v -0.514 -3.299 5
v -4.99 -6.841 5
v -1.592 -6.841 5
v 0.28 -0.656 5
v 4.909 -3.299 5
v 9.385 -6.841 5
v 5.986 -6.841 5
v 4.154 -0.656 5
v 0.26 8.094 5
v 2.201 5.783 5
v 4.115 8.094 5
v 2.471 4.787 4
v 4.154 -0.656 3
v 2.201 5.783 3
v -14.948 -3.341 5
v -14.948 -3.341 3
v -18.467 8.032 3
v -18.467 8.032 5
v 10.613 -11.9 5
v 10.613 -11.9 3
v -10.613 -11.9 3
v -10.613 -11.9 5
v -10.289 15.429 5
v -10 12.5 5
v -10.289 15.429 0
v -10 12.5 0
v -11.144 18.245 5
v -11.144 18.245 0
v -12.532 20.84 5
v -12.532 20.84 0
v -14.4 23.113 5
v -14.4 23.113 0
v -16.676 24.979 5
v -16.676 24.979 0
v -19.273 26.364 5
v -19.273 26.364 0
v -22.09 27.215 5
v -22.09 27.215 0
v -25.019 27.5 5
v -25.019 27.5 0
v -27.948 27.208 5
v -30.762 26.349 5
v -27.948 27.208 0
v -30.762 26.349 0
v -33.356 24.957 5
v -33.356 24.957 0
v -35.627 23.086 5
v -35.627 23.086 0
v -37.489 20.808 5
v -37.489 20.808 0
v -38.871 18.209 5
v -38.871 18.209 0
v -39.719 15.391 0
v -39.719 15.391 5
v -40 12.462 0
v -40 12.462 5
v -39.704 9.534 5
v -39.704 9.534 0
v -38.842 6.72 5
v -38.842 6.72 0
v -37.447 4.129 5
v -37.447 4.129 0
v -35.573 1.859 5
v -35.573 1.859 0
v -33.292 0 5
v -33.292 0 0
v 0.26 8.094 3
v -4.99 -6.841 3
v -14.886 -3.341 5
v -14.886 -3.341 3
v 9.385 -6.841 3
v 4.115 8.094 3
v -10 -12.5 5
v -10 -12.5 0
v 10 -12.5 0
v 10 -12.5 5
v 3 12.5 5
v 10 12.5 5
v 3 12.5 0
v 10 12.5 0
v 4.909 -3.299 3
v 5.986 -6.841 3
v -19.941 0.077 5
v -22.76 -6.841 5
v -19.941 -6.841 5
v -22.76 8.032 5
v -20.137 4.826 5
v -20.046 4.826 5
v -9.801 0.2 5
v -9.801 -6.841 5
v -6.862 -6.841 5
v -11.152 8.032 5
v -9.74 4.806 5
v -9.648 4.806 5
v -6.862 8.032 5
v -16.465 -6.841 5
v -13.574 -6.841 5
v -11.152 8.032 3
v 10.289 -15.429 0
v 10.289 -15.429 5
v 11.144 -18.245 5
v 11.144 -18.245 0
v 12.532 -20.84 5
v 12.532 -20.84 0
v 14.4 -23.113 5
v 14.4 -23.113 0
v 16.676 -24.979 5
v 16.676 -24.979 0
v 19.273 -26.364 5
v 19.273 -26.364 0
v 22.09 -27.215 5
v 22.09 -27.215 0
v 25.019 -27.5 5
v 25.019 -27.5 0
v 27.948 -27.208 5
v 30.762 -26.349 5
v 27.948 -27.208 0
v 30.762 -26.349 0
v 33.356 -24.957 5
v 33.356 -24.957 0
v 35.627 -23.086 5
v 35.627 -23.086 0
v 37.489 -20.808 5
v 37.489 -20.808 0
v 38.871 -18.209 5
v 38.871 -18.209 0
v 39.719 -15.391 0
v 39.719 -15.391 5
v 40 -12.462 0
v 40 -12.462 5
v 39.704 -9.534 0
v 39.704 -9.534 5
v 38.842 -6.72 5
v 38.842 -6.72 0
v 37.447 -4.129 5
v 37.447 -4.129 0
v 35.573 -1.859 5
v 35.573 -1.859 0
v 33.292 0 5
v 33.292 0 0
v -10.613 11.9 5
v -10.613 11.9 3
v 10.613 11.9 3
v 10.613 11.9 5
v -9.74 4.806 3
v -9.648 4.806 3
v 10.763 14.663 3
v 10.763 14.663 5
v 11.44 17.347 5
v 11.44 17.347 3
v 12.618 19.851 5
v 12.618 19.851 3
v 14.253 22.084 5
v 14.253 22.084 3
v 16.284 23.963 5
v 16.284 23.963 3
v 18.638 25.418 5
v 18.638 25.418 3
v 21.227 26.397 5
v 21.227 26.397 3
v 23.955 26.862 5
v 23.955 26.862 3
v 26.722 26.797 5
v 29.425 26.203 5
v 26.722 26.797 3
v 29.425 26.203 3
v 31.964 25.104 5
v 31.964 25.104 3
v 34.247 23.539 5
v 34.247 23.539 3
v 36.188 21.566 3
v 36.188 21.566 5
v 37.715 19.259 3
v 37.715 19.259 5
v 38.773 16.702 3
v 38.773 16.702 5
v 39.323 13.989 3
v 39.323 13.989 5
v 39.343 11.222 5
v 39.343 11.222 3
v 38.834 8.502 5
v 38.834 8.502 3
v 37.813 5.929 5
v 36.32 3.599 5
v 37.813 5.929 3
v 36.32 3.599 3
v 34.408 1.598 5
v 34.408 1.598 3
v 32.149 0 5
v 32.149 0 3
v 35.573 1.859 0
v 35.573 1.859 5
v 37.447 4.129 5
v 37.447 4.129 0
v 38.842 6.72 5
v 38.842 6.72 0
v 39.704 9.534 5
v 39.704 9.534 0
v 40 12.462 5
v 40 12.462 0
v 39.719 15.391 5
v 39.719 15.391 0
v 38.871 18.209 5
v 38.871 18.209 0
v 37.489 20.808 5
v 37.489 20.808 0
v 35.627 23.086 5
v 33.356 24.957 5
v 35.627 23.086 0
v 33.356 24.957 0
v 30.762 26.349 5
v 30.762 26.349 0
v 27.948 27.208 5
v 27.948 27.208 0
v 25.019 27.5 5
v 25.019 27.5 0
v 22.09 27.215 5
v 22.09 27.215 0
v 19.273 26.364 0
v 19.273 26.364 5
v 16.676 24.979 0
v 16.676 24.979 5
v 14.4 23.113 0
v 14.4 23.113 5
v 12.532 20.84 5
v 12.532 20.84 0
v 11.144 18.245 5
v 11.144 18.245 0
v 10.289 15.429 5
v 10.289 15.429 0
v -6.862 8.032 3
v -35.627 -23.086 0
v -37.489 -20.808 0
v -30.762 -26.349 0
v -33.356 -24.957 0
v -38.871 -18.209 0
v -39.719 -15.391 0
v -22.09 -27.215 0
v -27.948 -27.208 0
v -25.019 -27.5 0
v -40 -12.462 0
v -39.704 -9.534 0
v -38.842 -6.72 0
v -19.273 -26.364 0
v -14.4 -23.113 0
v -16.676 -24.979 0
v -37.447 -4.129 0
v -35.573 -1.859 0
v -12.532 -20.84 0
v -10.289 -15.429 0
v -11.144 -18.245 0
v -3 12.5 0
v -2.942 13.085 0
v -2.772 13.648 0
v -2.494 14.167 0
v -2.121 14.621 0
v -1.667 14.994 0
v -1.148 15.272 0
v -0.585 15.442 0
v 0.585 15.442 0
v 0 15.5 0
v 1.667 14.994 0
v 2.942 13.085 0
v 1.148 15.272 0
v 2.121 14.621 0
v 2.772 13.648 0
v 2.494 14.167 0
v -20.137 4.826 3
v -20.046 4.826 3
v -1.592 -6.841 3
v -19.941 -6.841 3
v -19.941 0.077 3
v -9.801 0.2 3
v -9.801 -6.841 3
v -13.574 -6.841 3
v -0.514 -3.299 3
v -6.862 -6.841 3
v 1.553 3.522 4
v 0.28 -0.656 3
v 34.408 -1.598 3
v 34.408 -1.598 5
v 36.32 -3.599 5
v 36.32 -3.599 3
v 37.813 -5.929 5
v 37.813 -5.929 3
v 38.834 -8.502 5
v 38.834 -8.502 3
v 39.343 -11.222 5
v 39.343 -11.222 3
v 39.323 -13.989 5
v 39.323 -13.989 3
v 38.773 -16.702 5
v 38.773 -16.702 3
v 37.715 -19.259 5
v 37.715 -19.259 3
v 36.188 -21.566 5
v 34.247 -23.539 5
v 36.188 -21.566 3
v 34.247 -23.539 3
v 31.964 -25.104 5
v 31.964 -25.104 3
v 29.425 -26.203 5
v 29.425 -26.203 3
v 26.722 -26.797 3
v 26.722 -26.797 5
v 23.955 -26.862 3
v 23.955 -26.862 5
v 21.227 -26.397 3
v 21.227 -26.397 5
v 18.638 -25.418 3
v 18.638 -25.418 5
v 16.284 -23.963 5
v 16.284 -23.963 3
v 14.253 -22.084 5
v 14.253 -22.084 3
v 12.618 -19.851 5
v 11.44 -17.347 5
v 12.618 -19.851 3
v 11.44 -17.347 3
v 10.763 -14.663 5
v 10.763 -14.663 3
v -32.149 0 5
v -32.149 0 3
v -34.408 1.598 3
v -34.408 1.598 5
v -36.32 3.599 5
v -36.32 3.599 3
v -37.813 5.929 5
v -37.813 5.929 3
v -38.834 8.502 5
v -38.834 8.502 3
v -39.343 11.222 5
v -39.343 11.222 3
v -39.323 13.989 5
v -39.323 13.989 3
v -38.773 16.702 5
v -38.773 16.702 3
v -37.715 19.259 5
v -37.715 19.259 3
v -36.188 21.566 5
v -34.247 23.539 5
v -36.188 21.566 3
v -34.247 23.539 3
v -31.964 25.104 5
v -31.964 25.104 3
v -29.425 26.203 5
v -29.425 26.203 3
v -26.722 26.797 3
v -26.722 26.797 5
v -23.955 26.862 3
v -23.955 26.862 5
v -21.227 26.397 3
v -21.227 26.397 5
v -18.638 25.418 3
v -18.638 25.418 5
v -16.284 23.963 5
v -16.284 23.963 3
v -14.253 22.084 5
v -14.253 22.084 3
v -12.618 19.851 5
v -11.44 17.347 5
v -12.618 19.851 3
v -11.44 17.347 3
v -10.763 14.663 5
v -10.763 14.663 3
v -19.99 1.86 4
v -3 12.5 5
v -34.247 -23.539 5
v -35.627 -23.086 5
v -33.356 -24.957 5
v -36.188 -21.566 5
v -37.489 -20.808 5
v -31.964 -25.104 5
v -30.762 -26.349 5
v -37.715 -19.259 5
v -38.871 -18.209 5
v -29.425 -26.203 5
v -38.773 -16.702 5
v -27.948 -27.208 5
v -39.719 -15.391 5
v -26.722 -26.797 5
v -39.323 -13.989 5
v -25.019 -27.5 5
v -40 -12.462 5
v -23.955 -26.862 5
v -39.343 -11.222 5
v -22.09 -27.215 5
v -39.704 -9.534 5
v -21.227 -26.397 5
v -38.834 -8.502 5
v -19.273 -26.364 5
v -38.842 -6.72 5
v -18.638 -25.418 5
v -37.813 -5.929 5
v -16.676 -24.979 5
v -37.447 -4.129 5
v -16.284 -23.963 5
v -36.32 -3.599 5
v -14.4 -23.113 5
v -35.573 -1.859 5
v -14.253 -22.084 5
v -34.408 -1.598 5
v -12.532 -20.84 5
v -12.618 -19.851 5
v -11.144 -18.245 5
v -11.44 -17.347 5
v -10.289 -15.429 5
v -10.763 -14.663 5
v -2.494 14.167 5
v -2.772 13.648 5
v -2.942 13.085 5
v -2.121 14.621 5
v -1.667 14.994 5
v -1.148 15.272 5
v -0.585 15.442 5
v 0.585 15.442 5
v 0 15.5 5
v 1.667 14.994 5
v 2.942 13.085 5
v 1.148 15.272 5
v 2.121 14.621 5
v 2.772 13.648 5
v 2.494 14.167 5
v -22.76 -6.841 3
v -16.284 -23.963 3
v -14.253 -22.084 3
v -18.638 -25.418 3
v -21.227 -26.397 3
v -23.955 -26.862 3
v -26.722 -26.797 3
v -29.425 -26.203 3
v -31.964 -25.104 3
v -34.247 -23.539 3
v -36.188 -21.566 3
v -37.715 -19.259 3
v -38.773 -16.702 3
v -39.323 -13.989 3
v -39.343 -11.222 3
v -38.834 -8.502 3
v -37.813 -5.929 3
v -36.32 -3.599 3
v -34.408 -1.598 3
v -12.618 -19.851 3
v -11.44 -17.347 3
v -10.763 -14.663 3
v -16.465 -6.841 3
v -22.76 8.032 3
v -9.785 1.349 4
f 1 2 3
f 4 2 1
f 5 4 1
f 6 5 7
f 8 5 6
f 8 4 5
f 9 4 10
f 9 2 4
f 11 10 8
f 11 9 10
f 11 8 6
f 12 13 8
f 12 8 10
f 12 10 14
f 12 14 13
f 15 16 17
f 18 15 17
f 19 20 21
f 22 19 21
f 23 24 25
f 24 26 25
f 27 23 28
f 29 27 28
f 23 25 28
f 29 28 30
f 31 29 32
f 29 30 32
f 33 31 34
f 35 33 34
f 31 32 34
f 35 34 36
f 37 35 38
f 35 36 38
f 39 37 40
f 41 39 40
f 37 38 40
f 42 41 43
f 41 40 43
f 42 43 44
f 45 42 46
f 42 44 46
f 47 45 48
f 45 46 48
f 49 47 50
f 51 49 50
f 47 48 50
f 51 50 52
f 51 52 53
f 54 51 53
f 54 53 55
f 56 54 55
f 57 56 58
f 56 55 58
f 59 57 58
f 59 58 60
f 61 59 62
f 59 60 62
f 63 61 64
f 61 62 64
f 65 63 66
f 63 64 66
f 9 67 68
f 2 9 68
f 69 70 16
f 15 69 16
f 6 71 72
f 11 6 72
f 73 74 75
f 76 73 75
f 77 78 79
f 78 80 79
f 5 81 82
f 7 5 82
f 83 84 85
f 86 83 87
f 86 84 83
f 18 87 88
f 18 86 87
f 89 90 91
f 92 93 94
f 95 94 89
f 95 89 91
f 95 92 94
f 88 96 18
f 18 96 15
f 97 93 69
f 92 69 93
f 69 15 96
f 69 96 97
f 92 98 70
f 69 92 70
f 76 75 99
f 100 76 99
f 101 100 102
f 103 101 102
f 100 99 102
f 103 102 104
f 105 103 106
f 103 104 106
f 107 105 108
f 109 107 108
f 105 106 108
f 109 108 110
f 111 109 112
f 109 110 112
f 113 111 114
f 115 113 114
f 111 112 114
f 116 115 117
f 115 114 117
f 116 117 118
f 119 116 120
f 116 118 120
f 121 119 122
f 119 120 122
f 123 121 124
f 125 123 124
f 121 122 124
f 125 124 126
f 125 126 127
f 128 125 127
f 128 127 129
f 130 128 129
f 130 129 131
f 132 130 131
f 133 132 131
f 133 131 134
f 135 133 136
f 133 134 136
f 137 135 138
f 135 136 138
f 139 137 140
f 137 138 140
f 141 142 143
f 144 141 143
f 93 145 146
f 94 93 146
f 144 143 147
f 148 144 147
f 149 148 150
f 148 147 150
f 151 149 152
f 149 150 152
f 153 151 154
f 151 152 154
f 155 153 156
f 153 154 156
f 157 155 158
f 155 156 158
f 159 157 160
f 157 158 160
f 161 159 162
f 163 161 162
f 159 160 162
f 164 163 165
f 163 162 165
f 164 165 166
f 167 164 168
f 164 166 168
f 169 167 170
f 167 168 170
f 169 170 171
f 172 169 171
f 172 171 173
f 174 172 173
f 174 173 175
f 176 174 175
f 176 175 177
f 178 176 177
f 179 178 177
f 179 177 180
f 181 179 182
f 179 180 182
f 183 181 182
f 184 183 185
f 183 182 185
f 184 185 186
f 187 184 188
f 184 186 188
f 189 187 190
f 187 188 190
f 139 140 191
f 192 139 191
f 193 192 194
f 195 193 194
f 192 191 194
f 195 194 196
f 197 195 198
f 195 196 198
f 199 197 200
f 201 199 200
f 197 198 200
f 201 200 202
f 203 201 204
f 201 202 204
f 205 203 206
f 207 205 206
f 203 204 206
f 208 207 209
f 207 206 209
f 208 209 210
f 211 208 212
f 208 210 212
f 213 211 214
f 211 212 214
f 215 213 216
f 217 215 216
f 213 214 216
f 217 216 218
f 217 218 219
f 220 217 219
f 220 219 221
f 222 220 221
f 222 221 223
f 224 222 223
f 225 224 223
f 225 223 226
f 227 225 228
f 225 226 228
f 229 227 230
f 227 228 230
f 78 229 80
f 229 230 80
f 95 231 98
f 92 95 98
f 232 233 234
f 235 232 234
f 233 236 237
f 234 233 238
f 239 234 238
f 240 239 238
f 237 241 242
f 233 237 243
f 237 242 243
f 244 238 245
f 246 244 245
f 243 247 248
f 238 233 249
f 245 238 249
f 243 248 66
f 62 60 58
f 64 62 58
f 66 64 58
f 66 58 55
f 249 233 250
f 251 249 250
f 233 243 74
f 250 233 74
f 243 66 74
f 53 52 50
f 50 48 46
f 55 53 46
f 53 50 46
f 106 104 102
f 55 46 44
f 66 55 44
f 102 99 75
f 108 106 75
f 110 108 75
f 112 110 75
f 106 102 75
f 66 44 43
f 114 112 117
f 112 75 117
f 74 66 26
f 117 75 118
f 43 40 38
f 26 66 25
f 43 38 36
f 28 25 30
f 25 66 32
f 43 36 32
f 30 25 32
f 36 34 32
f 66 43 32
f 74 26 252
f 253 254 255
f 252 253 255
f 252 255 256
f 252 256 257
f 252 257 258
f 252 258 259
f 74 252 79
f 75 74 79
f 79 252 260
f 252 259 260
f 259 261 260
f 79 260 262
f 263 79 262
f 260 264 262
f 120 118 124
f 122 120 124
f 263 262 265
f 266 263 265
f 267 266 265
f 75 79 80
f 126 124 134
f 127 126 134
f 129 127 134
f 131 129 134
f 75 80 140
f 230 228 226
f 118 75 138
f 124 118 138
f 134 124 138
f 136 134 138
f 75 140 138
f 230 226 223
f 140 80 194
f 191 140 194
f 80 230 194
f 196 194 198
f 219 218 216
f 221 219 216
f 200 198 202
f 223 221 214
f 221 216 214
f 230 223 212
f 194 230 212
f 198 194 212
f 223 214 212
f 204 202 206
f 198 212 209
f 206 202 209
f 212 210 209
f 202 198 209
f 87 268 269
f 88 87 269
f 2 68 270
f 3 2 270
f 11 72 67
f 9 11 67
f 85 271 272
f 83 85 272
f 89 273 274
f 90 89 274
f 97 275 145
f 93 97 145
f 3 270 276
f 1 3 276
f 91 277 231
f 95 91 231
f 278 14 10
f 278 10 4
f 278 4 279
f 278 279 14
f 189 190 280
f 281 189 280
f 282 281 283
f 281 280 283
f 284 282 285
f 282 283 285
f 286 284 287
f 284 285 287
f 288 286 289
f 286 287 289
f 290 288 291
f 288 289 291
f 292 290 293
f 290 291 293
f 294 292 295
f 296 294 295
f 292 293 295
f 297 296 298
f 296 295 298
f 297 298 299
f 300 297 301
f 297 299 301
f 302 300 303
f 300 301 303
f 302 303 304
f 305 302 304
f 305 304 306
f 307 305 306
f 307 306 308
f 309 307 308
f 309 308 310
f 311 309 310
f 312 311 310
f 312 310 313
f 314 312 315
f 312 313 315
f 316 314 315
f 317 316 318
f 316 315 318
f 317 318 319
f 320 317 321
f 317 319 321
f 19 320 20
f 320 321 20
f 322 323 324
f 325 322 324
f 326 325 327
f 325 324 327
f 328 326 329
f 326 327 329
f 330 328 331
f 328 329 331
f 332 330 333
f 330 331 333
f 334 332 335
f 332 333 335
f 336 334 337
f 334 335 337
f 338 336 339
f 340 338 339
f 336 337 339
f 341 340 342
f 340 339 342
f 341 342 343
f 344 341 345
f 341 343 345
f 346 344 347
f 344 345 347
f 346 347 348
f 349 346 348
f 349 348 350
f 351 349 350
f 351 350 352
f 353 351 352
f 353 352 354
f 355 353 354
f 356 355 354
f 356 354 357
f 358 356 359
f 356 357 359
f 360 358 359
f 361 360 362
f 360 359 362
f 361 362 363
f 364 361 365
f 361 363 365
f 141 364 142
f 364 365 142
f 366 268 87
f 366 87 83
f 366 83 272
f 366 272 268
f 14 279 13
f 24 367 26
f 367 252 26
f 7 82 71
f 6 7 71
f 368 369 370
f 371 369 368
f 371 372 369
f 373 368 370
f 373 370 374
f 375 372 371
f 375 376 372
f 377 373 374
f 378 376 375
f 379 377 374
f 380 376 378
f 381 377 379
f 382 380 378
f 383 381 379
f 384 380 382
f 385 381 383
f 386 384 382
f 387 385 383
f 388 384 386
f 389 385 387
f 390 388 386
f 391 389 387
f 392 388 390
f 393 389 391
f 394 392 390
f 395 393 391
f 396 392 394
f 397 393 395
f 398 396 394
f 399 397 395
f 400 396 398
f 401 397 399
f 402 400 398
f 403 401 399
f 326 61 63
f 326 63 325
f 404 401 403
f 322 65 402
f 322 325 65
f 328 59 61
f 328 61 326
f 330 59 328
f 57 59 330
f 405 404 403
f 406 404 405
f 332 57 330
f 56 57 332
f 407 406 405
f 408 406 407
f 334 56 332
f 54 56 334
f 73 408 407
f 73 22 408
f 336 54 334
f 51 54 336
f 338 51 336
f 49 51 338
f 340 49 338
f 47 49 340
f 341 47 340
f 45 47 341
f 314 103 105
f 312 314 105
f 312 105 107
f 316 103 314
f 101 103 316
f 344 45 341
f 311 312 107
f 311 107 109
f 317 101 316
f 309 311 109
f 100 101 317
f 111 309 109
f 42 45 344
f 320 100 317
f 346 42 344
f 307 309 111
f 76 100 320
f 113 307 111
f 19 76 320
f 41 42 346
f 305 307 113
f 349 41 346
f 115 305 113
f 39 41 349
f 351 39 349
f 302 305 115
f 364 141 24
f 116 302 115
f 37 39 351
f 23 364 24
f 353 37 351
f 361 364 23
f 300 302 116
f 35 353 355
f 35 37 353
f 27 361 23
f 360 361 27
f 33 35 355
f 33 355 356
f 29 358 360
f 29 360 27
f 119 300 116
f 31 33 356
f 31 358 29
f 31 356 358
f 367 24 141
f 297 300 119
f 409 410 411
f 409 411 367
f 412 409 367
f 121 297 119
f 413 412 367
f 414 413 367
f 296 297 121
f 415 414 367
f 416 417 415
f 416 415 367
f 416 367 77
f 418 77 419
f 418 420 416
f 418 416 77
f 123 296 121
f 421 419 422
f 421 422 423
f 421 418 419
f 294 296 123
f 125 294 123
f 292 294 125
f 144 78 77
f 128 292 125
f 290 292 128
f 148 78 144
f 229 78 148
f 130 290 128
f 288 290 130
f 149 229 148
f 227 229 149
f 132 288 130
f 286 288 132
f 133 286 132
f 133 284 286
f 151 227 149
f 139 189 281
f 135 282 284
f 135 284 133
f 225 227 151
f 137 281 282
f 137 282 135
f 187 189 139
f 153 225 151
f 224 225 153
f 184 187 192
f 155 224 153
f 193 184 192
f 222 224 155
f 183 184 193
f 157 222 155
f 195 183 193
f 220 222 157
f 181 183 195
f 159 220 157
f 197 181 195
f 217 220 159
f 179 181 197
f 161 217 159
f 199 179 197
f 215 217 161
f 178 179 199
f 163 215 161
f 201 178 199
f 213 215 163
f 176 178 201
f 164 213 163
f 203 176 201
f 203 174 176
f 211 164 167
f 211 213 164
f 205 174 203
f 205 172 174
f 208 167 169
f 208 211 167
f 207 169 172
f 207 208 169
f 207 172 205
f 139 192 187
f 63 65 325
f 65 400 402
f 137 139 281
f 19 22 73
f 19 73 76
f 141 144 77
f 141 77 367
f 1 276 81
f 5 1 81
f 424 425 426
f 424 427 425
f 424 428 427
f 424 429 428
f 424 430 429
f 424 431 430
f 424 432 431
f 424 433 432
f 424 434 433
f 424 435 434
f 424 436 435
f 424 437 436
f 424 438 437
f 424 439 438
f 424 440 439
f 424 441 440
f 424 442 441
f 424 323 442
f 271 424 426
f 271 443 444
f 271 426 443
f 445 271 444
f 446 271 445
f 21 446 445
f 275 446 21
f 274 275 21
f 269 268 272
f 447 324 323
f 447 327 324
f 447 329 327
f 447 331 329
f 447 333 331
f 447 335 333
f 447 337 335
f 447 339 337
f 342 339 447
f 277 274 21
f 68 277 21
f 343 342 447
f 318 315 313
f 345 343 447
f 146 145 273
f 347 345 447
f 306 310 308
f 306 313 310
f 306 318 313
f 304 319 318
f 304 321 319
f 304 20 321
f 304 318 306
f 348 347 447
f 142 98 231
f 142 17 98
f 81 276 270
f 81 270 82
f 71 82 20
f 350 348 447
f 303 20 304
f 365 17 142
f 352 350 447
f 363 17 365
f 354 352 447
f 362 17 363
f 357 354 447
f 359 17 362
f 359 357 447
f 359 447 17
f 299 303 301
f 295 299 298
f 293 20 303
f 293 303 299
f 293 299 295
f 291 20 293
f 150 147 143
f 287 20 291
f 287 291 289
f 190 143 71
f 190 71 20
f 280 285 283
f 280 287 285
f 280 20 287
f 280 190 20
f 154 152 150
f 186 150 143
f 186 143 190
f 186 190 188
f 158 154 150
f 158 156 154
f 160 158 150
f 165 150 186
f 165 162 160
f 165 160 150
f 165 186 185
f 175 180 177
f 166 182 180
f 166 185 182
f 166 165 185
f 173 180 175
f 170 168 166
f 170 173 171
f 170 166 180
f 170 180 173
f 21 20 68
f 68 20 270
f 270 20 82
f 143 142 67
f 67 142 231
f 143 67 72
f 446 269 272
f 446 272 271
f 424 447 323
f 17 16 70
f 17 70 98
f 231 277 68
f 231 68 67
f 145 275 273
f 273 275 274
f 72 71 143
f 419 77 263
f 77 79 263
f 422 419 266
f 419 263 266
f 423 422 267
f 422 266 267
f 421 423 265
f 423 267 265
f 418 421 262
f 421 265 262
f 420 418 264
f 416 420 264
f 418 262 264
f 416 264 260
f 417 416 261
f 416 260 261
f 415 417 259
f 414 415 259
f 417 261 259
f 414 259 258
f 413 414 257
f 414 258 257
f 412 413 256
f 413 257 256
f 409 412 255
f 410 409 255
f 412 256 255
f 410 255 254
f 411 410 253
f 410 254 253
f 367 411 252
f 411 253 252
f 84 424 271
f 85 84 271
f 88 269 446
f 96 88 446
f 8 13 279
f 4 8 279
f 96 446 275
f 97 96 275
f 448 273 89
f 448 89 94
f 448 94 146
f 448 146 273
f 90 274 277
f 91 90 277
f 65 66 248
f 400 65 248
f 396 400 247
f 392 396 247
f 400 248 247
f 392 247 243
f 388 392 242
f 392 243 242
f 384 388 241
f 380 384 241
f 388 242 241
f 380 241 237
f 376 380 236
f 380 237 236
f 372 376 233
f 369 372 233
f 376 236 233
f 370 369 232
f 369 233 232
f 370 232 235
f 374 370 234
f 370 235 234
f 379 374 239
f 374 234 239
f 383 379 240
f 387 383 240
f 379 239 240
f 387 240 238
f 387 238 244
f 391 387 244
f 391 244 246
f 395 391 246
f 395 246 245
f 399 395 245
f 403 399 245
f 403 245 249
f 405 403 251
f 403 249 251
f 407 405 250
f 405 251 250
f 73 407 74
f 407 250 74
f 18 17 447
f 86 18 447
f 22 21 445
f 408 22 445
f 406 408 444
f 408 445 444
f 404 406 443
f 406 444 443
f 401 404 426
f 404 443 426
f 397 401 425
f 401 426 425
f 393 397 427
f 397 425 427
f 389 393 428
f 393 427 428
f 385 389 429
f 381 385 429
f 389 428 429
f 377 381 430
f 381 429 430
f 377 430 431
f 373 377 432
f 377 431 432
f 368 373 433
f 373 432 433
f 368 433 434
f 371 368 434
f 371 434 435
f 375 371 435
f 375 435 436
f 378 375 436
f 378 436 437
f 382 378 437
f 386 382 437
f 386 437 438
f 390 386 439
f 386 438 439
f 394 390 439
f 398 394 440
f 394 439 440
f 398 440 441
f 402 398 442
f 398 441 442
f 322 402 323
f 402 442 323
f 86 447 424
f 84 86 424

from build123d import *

# Parameters (mm, degrees)
F1_DEPTH = 3
F3_DEPTH = 2
F5_DEPTH = 2
F6_DEPTH = 2


# Not quite as in the source:
# - a feature of the source that left no trace in its solid (it failed there, or was rolled back) is left out


with BuildPart() as f1:
    # F0 (on Top) → F1 (new body)
    with BuildSketch(Plane.XY):
        with BuildLine():
            Line((-3, 12.5), (-10, 12.5))
            ThreePointArc((-10, 12.5), (-32.0931858273, 25.7169101843), (-33.2915619759, 0))
            ThreePointArc((-33.2915619759, 0), (-32.0931858273, -25.7169101843), (-10, -12.5))
            Line((-10, -12.5), (10, -12.5))
            ThreePointArc((10, -12.5), (32.0931858273, -25.7169101843), (33.2915619759, 0))
            ThreePointArc((33.2915619759, 0), (32.0931858273, 25.7169101843), (10, 12.5))
            Line((10, 12.5), (3, 12.5))
            ThreePointArc((3, 12.5), (0, 15.5), (-3, 12.5))
        make_face()
    extrude(amount=F1_DEPTH)

    # F2 (on face) → F3 (join)
    with BuildSketch(Plane.XY.offset(3)):
        with BuildLine():
            ThreePointArc((33.2915619759, 0), (32.0931858273, 25.7169101843), (10, 12.5))
            Line((10, 12.5), (3, 12.5))
            ThreePointArc((3, 12.5), (0, 15.5), (-3, 12.5))
            Line((-3, 12.5), (-10, 12.5))
            ThreePointArc((-10, 12.5), (-32.0931858273, 25.7169101843), (-33.2915619759, 0))
            ThreePointArc((-33.2915619759, 0), (-32.0931858273, -25.7169101843), (-10, -12.5))
            Line((-10, -12.5), (10, -12.5))
            ThreePointArc((10, -12.5), (32.0931858273, -25.7169101843), (33.2915619759, 0))
        make_face()
        with BuildLine():
            ThreePointArc((-10.6125054301, -11.9), (-31.9642656137, -25.1039281362), (-32.1491258207, 0))
            ThreePointArc((-32.1491258207, 0), (-31.9642656137, 25.1039281362), (-10.6125054301, 11.9))
            Line((-10.6125054301, 11.9), (0, 11.9))
            Line((0, 11.9), (10.6125054301, 11.9))
            ThreePointArc((10.6125054301, 11.9), (31.9642656137, 25.1039281362), (32.1491258207, 0))
            ThreePointArc((32.1491258207, 0), (31.9642656137, -25.1039281362), (10.6125054301, -11.9))
            Line((10.6125054301, -11.9), (-10.6125054301, -11.9))
        make_face(mode=Mode.SUBTRACT)
    extrude(amount=F3_DEPTH)

    # F4 (on face) → F5 (join)
    with BuildSketch(Plane.XY.offset(3)):
        with BuildLine():
            Line((-20.0455729167, 4.8259567143), (-16.46484375, -6.8407099524))
            Line((-16.46484375, -6.8407099524), (-13.57421875, -6.8407099524))
            Line((-13.57421875, -6.8407099524), (-9.7395833333, 4.8064254643))
            Line((-9.7395833333, 4.8064254643), (-9.6484375, 4.8064254643))
            add(Edge.make_bspline(
                [(-9.78515625, 1.3493942143), (-9.7688802083, 2.000435881), (-9.6484375, 4.8064254643)],
                knots=[0, 0, 0, 1, 1, 1], degree=2))
            add(Edge.make_bspline(
                [(-9.8014322917, 0.2003056726), (-9.8014322917, 0.6983525476), (-9.78515625, 1.3493942143)],
                knots=[0, 0, 0, 1, 1, 1], degree=2))
            Line((-9.8014322917, 0.2003056726), (-9.8014322917, -6.8407099524))
            Line((-9.8014322917, -6.8407099524), (-6.8619791667, -6.8407099524))
            Line((-6.8619791667, -6.8407099524), (-6.8619791667, 8.0323369226))
            Line((-6.8619791667, 8.0323369226), (-11.15234375, 8.0323369226))
            Line((-11.15234375, 8.0323369226), (-14.8860677083, -3.341360994))
            Line((-14.8860677083, -3.341360994), (-14.9479166667, -3.341360994))
            Line((-14.9479166667, -3.341360994), (-18.466796875, 8.0323369226))
            Line((-18.466796875, 8.0323369226), (-22.7604166667, 8.0323369226))
            Line((-22.7604166667, 8.0323369226), (-22.7604166667, -6.8407099524))
            Line((-22.7604166667, -6.8407099524), (-19.94140625, -6.8407099524))
            Line((-19.94140625, -6.8407099524), (-19.94140625, 0.076607756))
            add(Edge.make_bspline(
                [(-20.13671875, 4.8259567143), (-19.94140625, 1.268014006), (-19.94140625, 0.076607756)],
                knots=[0, 0, 0, 1, 1, 1], degree=2))
            Line((-20.13671875, 4.8259567143), (-20.0455729167, 4.8259567143))
        make_face()
    extrude(amount=F5_DEPTH)

    # F4 (on face) → F6 (join)
    with BuildSketch(Plane.XY.offset(3)):
        Polygon((4.9088541667, -3.2990432857), (5.986328125, -6.8407099524), (9.384765625, -6.8407099524), (4.1145833333, 8.094185881), (0.2604166667, 8.094185881), (-4.990234375, -6.8407099524), (-1.591796875, -6.8407099524), (-0.5143229167, -3.2990432857), align=None)
        with BuildLine():
            add(Edge.make_bspline(
                [(4.1536458333, -0.655814119), (2.6595052083, 4.1553837976), (2.470703125, 4.7868942143)],
                knots=[0, 0, 0, 1, 1, 1], degree=2))
            Line((4.1536458333, -0.655814119), (0.2799479167, -0.655814119))
            add(Edge.make_bspline(
                [(2.2005208333, 5.7829879643), (1.865234375, 4.480904631), (0.2799479167, -0.655814119)],
                knots=[0, 0, 0, 1, 1, 1], degree=2))
            add(Edge.make_bspline(
                [(2.470703125, 4.7868942143), (2.2819010417, 5.418404631), (2.2005208333, 5.7829879643)],
                knots=[0, 0, 0, 1, 1, 1], degree=2))
        make_face(mode=Mode.SUBTRACT)
    extrude(amount=F6_DEPTH)


solid = f1.part
